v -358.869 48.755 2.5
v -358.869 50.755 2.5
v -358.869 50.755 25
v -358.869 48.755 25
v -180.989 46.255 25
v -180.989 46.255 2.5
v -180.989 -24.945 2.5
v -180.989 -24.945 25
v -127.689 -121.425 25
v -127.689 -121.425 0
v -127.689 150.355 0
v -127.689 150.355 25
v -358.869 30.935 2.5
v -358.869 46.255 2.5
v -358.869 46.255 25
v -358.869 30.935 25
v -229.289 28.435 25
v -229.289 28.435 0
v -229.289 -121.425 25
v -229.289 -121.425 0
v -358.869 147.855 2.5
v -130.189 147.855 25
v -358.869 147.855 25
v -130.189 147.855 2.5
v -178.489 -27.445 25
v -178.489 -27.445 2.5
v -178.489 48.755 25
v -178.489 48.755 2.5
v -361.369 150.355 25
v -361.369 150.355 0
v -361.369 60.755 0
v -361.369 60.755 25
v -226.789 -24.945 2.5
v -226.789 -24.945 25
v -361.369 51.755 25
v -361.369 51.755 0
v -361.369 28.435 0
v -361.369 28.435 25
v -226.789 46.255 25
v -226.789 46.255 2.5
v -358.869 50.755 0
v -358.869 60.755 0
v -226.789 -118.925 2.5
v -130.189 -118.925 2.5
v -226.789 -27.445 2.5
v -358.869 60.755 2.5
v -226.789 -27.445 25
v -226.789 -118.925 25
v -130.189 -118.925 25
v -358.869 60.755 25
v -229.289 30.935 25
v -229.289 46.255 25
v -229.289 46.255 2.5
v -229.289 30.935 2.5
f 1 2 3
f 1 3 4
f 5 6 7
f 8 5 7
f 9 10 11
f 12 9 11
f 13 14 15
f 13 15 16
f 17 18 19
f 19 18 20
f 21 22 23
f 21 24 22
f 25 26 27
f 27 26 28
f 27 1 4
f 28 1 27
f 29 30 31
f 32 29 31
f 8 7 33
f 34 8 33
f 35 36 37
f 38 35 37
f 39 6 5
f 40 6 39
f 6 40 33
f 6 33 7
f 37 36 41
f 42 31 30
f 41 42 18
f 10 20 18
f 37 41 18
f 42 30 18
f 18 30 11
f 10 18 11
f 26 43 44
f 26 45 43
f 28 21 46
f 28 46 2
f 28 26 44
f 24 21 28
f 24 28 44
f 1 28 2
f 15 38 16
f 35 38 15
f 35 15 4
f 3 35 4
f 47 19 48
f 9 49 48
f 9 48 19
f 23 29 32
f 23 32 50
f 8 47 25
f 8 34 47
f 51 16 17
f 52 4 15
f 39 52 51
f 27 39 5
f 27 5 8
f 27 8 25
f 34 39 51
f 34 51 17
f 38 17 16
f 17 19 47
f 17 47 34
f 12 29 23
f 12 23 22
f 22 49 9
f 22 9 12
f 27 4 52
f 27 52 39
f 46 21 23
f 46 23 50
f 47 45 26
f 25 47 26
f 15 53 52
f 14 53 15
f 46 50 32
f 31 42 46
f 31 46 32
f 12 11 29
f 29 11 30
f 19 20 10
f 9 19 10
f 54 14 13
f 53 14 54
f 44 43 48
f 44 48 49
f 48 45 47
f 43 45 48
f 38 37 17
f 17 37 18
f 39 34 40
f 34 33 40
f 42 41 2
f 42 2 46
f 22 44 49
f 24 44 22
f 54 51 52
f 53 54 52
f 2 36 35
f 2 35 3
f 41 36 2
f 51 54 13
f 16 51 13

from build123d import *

# Parameters (mm, degrees)
F0_W      = 76.2
F0_H      = 20.32
F0_W_2    = 55.88
F1_DEPTH  = 25
F2_T      = -2.5
F3_W      = 134.58
F3_H      = 20.32
F4_DEPTH  = 22.5
F5_T      = -2.5
F6_W      = 48.3
F6_H      = 76.2
F7_DEPTH  = 25
F8_T      = -2.5
F10_DEPTH = 30


# Not quite as in the source:
# - a shell that OpenCascade refuses in one call is made with other operations: the cavity is built on its own and cut out


with BuildPart() as f1:
    # F0 (on Top) → F1 (new body)
    with BuildSketch(Plane.XY):
        Polygon((-361.3686263561, 74.1551402664), (-361.3686263561, 48.7551402664), (-285.1686263561, 48.7551402664), (-229.2886263561, 48.7551402664), (-178.4886263561, 48.7551402664), (-178.4886263561, -27.4448597336), (-148.0086263561, -27.4448597336), (-148.0086263561, 150.3551402664), (-236.9086263561, 150.3551402664), (-272.4686263561, 150.3551402664), (-361.3686263561, 150.3551402664), align=None)
        with Locations((-323.2686263561, 38.5951402664)):
            Rectangle(F0_W, F0_H)
        with Locations((-257.2286263561, 38.5951402664)):
            Rectangle(F0_W_2, F0_H)
        Polygon((-178.4886263561, 48.7551402664), (-229.2886263561, 48.7551402664), (-229.2886263561, 28.4351402664), (-229.2886263561, -27.4448597336), (-178.4886263561, -27.4448597336), align=None)
        Polygon((-178.4886263561, -27.4448597336), (-229.2886263561, -27.4448597336), (-229.2886263561, -121.4248597336), (-127.6886263561, -121.4248597336), (-127.6886263561, 150.3551402664), (-148.0086263561, 150.3551402664), (-148.0086263561, -27.4448597336), align=None)
    extrude(amount=F1_DEPTH)

    # F2
    f2_openings = [f1.faces().sort_by_distance(p)[0] for p in [
        (-221.527682, 42.066274, 25),
    ]]
    offset(amount=F2_T, openings=f2_openings, kind=Kind.INTERSECTION)

    # F3 (on face) → F4 (join)
    with BuildSketch(Plane.XY.offset(2.5)):
        with Locations((-294.0786263561, 38.5951402664)):
            Rectangle(F3_W, F3_H)
    extrude(amount=F4_DEPTH)

    # F5: a shell. OpenCascade refuses it in one call, so the cavity is built on its own and cut out:
    # the body offset inwards by the wall thickness, plus a prism from it out through each open face.
    f5_core = offset(f1.part, amount=F5_T, kind=Kind.INTERSECTION, mode=Mode.PRIVATE)
    f5_exits = [f5_core.faces().sort_by_distance(p)[0] for p in [
        (-294.078626, 38.59514, 22.5),
    ]]
    add(f5_core, mode=Mode.SUBTRACT)
    extrude(f5_exits, amount=-F5_T, mode=Mode.SUBTRACT)

    # F6 (on Top) → F7 (join)
    with BuildSketch(Plane.XY):
        with Locations((-202.6386263561, 10.6551402664)):
            Rectangle(F6_W, F6_H)
    extrude(amount=F7_DEPTH)

    # F8: a shell. OpenCascade refuses it in one call, so the cavity is built on its own and cut out:
    # the body offset inwards by the wall thickness, plus a prism from it out through each open face.
    f8_core = offset(f1.part, amount=F8_T, kind=Kind.INTERSECTION, mode=Mode.PRIVATE)
    f8_exits = [f8_core.faces().sort_by_distance(p)[0] for p in [
        (-203.888626, 10.65514, 22.5),
    ]]
    add(f8_core, mode=Mode.SUBTRACT)
    extrude(f8_exits, amount=-F8_T, mode=Mode.SUBTRACT)

    # F9 (on Top) → F10 (cut)
    with BuildSketch(Plane.XY):
        Polygon((-358.8686263561, 60.7551402664), (-361.3686263561, 60.7551402664), (-361.3686263561, 51.7551402664), (-358.8686263561, 50.7551402664), align=None)
    extrude(amount=F10_DEPTH, mode=Mode.SUBTRACT)


solid = f1.part
